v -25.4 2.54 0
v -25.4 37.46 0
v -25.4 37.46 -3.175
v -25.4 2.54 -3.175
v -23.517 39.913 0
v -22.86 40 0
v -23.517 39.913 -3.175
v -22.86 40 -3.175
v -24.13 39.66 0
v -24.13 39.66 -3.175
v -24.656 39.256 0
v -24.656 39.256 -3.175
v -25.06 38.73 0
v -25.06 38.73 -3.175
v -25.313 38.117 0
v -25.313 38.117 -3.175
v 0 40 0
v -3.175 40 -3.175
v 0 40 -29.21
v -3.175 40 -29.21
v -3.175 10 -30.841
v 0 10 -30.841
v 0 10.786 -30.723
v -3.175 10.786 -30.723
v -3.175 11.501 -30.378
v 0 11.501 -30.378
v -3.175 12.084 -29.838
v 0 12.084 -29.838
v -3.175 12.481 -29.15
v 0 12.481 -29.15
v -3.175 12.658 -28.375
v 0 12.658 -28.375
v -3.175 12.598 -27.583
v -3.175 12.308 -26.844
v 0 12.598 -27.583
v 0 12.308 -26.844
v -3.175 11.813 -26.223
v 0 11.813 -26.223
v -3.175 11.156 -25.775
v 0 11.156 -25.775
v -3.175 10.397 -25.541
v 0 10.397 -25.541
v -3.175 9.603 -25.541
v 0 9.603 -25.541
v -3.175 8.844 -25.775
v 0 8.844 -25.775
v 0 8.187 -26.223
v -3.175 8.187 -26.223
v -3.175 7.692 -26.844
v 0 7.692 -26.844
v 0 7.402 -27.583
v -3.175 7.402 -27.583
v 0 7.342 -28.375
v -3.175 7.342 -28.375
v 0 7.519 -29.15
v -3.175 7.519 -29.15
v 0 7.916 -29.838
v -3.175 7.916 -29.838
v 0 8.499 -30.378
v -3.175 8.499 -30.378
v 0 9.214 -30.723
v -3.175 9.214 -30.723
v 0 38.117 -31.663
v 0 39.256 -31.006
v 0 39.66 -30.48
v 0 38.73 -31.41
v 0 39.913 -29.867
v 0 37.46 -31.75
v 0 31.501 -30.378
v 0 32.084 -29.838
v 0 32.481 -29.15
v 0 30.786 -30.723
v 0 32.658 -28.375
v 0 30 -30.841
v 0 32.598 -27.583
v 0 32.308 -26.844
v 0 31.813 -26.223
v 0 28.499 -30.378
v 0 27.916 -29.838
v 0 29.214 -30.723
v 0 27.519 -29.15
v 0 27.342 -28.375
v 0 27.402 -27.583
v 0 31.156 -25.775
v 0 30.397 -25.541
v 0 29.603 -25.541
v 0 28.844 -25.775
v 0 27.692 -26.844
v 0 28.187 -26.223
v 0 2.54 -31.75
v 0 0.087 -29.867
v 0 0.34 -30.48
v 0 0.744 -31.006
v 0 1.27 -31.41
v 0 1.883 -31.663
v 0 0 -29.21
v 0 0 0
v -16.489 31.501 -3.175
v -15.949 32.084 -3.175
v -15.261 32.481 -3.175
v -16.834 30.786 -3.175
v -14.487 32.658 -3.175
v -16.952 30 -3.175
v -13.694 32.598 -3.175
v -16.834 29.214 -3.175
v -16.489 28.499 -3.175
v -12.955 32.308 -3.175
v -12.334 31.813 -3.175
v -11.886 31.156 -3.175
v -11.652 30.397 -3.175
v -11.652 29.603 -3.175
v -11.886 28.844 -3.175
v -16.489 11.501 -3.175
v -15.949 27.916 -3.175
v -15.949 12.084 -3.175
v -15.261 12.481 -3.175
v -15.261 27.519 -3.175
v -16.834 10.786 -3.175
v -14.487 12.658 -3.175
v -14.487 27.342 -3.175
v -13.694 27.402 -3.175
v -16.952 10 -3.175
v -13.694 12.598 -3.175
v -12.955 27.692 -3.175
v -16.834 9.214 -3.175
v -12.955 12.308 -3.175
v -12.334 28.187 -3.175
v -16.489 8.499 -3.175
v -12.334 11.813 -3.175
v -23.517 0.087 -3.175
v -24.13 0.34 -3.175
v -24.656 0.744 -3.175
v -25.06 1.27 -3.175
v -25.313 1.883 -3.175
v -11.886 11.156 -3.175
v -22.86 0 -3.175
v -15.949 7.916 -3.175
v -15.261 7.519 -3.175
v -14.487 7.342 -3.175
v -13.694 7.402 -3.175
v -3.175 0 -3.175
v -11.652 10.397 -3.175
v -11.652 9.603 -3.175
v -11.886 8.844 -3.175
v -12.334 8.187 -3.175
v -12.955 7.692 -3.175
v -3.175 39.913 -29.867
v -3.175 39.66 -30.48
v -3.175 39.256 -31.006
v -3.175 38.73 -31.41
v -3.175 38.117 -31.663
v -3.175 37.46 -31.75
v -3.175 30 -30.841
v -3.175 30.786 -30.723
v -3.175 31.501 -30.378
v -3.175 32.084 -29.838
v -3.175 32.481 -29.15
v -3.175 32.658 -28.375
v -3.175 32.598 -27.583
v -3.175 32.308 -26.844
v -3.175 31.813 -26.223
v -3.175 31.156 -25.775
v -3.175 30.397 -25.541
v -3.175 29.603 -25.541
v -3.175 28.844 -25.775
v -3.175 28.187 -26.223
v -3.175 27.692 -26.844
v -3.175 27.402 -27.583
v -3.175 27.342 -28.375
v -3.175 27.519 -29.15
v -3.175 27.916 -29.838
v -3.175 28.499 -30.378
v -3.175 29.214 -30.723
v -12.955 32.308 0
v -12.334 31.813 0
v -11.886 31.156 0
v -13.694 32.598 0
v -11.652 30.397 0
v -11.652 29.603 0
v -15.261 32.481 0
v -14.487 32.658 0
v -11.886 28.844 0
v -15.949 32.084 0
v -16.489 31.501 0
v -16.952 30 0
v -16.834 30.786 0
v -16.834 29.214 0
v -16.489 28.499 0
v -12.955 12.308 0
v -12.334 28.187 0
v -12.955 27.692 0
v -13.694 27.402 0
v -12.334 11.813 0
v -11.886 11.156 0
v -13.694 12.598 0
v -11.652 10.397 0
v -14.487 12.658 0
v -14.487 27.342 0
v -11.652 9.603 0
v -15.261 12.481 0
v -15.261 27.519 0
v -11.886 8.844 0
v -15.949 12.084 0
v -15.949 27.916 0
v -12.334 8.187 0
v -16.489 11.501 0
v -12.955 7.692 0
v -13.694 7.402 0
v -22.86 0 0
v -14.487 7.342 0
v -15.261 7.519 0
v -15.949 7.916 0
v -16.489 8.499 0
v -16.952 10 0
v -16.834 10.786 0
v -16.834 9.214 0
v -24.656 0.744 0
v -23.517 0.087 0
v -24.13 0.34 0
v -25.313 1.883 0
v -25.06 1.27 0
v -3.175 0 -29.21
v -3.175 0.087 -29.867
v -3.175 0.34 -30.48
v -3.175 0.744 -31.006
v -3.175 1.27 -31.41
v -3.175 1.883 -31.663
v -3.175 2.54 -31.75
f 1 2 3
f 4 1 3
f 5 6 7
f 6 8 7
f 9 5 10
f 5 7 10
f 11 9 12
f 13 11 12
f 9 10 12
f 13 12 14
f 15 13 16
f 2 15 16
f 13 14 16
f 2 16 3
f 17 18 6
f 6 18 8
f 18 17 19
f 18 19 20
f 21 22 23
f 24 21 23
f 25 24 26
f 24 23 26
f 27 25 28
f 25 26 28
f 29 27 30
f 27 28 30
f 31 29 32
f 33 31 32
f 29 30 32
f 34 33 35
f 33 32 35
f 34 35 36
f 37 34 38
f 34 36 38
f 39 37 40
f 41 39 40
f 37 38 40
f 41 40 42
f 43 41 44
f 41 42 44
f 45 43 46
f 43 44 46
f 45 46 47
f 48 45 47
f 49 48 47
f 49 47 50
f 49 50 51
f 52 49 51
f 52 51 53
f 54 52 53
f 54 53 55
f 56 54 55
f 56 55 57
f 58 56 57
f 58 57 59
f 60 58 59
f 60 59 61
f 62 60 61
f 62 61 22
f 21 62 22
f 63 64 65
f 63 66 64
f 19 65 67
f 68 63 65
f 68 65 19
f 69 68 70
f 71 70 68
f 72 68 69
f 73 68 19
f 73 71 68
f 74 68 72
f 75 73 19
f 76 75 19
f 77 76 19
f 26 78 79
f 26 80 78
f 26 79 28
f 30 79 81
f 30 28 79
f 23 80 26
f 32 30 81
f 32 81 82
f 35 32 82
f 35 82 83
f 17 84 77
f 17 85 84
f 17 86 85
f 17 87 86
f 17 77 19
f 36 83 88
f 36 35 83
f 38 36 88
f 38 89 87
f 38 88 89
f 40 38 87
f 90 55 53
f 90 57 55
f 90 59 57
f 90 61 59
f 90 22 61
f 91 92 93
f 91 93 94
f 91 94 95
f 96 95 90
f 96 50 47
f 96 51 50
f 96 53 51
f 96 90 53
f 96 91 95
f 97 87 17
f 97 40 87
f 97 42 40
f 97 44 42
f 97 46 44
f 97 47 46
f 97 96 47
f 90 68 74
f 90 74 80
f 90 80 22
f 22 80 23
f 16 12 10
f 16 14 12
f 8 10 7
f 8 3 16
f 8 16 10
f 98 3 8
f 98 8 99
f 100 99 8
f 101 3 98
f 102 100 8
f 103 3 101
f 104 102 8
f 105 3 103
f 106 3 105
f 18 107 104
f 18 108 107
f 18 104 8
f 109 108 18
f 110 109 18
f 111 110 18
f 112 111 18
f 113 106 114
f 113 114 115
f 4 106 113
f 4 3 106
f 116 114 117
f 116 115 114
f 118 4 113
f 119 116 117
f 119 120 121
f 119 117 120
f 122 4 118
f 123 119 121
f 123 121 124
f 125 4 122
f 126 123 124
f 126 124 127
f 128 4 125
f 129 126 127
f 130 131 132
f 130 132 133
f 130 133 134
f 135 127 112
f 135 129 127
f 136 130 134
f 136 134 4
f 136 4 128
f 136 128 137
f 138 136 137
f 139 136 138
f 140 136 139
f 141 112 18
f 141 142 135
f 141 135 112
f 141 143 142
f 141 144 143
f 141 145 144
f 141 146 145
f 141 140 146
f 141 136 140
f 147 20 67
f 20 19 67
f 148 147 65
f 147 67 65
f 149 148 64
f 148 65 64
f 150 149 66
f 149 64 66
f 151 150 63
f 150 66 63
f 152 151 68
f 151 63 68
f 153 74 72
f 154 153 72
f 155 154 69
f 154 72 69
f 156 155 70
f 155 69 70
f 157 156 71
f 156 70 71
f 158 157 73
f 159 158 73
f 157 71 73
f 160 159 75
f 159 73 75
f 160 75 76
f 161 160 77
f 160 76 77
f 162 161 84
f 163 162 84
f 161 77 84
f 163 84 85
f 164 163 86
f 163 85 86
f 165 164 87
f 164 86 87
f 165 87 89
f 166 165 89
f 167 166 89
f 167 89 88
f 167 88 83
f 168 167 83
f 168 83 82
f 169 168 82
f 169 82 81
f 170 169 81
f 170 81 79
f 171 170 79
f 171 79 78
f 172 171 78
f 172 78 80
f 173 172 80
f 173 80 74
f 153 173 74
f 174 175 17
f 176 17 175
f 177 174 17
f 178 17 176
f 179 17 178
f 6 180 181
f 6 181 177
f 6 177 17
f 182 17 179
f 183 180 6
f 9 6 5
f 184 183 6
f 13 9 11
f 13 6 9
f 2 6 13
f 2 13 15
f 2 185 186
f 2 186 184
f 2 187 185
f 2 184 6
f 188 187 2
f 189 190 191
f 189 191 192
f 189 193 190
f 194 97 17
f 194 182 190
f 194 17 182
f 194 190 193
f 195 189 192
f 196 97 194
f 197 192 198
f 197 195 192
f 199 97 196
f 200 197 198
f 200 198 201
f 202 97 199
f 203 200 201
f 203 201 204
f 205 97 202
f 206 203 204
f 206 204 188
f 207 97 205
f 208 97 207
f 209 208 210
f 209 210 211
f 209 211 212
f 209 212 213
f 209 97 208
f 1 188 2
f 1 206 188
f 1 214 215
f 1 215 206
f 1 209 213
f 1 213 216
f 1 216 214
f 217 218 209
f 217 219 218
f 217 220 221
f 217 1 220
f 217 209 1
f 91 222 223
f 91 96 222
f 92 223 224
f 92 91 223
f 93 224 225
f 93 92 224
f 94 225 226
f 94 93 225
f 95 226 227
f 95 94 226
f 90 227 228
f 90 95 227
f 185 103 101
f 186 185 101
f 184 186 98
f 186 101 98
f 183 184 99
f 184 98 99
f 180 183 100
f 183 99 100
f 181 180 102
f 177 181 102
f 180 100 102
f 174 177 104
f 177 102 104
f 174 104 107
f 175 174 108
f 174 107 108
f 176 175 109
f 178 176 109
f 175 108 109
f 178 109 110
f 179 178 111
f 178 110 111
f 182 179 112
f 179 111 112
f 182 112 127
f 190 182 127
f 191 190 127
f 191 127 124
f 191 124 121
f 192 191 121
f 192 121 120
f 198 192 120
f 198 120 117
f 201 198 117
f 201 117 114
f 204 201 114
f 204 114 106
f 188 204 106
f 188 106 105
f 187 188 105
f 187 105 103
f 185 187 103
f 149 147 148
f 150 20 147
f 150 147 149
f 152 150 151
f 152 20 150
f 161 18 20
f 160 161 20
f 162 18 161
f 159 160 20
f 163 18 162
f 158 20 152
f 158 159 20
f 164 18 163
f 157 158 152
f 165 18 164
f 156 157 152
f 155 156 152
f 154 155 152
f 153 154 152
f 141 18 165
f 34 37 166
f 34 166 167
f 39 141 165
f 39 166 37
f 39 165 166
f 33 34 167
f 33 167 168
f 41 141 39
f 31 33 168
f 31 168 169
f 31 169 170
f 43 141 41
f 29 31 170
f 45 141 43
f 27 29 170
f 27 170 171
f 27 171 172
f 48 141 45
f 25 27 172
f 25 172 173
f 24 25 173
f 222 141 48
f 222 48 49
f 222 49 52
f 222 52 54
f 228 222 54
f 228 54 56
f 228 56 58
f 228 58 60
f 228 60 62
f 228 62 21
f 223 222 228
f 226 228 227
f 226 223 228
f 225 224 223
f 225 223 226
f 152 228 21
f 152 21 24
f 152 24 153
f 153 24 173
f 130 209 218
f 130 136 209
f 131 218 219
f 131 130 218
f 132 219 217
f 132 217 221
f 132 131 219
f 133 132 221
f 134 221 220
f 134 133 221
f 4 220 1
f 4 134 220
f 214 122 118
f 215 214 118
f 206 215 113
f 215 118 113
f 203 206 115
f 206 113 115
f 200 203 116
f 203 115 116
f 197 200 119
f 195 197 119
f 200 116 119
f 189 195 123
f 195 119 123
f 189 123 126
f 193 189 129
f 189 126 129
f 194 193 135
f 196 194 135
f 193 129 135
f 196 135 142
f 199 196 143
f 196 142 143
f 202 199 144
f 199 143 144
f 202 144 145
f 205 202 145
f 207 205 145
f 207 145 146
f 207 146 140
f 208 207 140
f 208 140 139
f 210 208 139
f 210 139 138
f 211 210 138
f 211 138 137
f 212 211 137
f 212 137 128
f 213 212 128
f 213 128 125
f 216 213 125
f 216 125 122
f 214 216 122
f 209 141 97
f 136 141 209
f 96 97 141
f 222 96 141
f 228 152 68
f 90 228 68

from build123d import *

# Parameters (mm, degrees)
BOSS_EXTRUDE1_DEPTH = 40
CUT_EXTRUDE1_REACH  = 57.333
SKETCH2_R           = 2.665
CUT_EXTRUDE2_REACH  = 59.037
SKETCH3_R           = 2.665
FILLET1_R           = 2.54


with BuildPart() as part:
    # Sketch1 → Boss-Extrude1 (new body)
    with BuildSketch(Plane(origin=(0, 0, 0), x_dir=(1, 0, 0), z_dir=(0, 1, 0))):
        Polygon((0, 0), (-25.4, 0), (-25.4, 3.175), (-3.175, 3.175), (-3.175, 31.75), (0, 31.75), align=None)
    extrude(amount=BOSS_EXTRUDE1_DEPTH)

    # Sketch2 → Cut-Extrude1 (cut, up to next)
    with BuildSketch(Plane(origin=(0, 0, -3.175), x_dir=(-1, 0, 0), z_dir=(0, 0, -1)), mode=Mode.PRIVATE) as cut_extrude1_sk1:
        with Locations((14.2875, 30)):
            Circle(SKETCH2_R)
    cut_extrude1_tool1 = extrude(cut_extrude1_sk1.sketch, amount=-CUT_EXTRUDE1_REACH, mode=Mode.PRIVATE) & part.part
    # Sketch2 → Cut-Extrude1 (cut, up to next)
    with BuildSketch(Plane(origin=(0, 0, -3.175), x_dir=(-1, 0, 0), z_dir=(0, 0, -1)), mode=Mode.PRIVATE) as cut_extrude1_sk2:
        with Locations((14.2875, 10)):
            Circle(SKETCH2_R)
    cut_extrude1_tool2 = extrude(cut_extrude1_sk2.sketch, amount=-CUT_EXTRUDE1_REACH, mode=Mode.PRIVATE) & part.part
    add(cut_extrude1_tool1.solids().sort_by_distance((-14.2875, 30, -3.175))[0], mode=Mode.SUBTRACT)
    add(cut_extrude1_tool2.solids().sort_by_distance((-14.2875, 10, -3.175))[0], mode=Mode.SUBTRACT)

    # Sketch3 → Cut-Extrude2 (cut, up to next)
    with BuildSketch(Plane(origin=(0, 0, 0), x_dir=(0, 0, -1), z_dir=(1, 0, 0)), mode=Mode.PRIVATE) as cut_extrude2_sk1:
        with Locations((28.17625, 10)):
            Circle(SKETCH3_R)
    cut_extrude2_tool1 = extrude(cut_extrude2_sk1.sketch, amount=-CUT_EXTRUDE2_REACH, mode=Mode.PRIVATE) & part.part
    # Sketch3 → Cut-Extrude2 (cut, up to next)
    with BuildSketch(Plane(origin=(0, 0, 0), x_dir=(0, 0, -1), z_dir=(1, 0, 0)), mode=Mode.PRIVATE) as cut_extrude2_sk2:
        with Locations((28.17625, 30)):
            Circle(SKETCH3_R)
    cut_extrude2_tool2 = extrude(cut_extrude2_sk2.sketch, amount=-CUT_EXTRUDE2_REACH, mode=Mode.PRIVATE) & part.part
    add(cut_extrude2_tool1.solids().sort_by_distance((0, 10, -28.17625))[0], mode=Mode.SUBTRACT)
    add(cut_extrude2_tool2.solids().sort_by_distance((0, 30, -28.17625))[0], mode=Mode.SUBTRACT)

    # Fillet1
    fillet1_edges = [part.edges().sort_by_distance(p)[0] for p in [
        (-25.4, 40, -1.5875),
        (-25.4, 0, -1.5875),
        (-1.5875, 40, -31.75),
        (-1.5875, 0, -31.75),
    ]]
    fillet(fillet1_edges, radius=FILLET1_R)


solid = part.part
